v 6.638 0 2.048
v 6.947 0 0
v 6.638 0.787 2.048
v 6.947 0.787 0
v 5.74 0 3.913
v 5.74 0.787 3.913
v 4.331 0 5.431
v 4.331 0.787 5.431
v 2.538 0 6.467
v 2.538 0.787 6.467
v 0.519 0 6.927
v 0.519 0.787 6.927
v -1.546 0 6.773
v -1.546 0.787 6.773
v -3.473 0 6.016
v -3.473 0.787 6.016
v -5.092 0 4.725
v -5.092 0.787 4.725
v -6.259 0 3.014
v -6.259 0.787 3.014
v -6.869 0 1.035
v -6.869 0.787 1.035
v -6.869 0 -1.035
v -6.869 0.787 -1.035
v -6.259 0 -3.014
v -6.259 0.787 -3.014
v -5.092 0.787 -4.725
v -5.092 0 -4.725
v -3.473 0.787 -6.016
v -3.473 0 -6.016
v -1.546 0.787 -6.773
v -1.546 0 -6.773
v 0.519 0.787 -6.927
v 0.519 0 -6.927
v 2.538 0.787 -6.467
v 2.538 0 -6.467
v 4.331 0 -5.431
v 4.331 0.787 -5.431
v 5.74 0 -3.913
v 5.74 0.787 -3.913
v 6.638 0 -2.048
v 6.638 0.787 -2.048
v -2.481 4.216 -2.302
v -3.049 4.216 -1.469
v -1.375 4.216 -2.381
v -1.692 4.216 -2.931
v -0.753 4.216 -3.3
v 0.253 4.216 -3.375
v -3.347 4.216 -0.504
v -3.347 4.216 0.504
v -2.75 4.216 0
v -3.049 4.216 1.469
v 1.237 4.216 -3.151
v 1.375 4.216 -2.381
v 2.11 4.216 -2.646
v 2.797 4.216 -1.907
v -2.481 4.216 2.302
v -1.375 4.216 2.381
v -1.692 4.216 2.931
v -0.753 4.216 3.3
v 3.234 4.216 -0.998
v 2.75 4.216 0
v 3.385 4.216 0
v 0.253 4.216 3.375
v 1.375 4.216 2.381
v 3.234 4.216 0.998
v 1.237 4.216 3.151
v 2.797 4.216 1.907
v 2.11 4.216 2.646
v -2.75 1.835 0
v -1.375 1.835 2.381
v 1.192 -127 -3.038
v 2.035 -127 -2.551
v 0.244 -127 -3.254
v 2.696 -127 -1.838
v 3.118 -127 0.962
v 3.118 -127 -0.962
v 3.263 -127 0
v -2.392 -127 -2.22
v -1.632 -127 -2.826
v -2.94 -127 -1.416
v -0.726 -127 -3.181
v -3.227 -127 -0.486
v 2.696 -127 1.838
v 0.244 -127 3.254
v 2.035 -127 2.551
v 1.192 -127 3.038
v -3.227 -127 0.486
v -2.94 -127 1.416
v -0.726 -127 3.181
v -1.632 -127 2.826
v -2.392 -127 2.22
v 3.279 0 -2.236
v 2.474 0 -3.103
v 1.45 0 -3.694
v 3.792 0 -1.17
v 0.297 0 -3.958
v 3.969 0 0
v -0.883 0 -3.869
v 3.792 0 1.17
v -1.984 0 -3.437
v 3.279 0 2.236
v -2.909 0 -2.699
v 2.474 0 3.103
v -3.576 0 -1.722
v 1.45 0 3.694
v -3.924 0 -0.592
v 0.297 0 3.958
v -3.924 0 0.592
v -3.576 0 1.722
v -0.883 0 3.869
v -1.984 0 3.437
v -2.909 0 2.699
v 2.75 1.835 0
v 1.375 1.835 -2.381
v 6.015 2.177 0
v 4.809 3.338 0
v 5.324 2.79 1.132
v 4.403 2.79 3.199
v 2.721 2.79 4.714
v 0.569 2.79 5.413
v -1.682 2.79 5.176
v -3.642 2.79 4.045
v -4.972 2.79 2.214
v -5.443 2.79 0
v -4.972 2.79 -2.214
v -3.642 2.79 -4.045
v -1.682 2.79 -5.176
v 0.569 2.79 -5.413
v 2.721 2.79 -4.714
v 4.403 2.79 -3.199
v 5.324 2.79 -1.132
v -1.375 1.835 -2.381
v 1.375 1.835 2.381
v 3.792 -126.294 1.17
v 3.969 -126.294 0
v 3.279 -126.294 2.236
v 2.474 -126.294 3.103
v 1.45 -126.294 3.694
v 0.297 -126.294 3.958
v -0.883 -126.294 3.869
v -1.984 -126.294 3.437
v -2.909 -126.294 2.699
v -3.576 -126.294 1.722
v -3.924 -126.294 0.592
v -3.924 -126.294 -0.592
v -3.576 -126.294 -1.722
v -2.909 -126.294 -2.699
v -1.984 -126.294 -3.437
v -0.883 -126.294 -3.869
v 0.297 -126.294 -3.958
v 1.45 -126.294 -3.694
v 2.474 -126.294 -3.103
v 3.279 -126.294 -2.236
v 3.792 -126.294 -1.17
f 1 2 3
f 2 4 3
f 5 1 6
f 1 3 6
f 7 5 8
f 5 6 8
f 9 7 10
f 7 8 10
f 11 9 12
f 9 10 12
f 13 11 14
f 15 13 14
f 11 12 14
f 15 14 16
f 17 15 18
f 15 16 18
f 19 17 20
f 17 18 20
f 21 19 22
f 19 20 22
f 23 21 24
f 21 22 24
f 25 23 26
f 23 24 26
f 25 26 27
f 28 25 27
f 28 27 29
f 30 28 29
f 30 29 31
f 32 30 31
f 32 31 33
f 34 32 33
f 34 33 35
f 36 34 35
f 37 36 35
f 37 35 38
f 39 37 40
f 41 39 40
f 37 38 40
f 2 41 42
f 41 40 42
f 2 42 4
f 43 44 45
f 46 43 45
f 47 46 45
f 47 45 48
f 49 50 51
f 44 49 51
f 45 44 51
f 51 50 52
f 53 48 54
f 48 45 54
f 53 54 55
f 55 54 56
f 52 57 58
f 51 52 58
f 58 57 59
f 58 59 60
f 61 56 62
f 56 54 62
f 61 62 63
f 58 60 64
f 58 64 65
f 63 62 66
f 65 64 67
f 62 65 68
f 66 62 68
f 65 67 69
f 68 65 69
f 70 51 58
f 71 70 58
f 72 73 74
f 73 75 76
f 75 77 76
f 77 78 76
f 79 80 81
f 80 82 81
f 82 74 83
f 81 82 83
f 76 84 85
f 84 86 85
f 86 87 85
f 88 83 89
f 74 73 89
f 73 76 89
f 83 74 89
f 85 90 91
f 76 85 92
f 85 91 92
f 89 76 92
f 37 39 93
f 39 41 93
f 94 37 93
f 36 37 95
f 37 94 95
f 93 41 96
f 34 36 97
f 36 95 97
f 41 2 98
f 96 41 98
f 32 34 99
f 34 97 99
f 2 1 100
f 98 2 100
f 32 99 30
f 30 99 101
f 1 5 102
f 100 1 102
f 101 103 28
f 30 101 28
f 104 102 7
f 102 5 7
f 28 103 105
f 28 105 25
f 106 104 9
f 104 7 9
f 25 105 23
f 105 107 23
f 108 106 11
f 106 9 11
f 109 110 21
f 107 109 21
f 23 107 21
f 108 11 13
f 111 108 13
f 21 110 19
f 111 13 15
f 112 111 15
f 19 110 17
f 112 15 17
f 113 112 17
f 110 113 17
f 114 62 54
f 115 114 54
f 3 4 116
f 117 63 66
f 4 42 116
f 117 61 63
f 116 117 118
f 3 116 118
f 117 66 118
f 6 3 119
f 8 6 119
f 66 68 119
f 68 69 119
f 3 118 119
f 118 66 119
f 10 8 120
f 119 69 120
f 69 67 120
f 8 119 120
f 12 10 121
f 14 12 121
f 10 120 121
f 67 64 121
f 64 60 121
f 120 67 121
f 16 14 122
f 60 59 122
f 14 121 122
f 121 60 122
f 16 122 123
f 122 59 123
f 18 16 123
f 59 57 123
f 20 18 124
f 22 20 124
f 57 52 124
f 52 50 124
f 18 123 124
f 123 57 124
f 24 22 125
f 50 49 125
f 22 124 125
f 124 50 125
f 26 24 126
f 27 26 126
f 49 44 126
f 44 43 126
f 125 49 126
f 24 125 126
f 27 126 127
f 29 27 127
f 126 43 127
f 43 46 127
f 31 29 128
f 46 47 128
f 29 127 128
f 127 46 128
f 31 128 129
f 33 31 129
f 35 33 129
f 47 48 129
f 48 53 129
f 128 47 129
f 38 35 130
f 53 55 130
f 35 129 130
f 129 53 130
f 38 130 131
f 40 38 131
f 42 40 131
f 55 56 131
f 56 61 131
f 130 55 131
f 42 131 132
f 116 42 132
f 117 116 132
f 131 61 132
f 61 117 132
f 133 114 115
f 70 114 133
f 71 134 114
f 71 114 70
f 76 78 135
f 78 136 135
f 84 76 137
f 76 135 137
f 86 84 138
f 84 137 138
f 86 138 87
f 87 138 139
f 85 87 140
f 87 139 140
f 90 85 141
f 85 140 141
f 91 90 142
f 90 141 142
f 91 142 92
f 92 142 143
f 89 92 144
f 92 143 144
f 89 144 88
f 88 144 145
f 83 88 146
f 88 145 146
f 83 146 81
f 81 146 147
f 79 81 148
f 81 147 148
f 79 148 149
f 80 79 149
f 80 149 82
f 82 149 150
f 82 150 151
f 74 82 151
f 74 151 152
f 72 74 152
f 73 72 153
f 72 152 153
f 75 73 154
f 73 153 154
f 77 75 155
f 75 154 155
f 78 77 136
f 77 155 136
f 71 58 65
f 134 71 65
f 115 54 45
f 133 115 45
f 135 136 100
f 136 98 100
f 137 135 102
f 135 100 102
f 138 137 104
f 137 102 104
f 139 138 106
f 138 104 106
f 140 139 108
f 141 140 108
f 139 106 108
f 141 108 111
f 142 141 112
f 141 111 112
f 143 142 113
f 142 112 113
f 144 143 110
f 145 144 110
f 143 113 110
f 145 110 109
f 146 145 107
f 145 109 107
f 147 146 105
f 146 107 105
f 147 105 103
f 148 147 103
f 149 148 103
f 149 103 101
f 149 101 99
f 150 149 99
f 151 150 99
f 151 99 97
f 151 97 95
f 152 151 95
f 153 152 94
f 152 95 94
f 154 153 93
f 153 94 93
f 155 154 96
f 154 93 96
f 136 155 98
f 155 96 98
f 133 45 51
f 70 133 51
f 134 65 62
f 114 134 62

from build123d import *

# Parameters (mm, degrees)
CUT_EXTRUDE1_DEPTH = 2.38125


with BuildPart() as part:
    # Sketch1 → Base-Revolve (revolve)
    with BuildSketch(Plane.XY):
        with BuildLine():
            Line((0, -127), (3.263194444, -127))
            Line((3.263194444, -127), (3.96875, -126.294444444))
            Line((3.96875, -126.294444444), (3.96875, 0))
            Line((3.96875, 0), (6.9469, 0))
            Line((6.9469, 0), (6.9469, 0.7874))
            ThreePointArc((6.9469, 0.7874), (5.442852348, 2.789756108), (3.384630657, 4.2164))
            Line((3.384630657, 4.2164), (0, 4.2164))
            Line((0, 4.2164), (0, -127))
        make_face()
    revolve(axis=Axis((0, 69.088, 0), (0, -1, 0)))

    # Sketch2 → Cut-Extrude1 (cut)
    with BuildSketch(Plane(origin=(0, 4.2164, 0), x_dir=(-1, 0, 0), z_dir=(0, 1, 0))):
        Polygon((-2.749630657, 0), (-1.374815329, -2.38125), (1.374815329, -2.38125), (2.749630657, 0), (1.374815329, 2.38125), (-1.374815329, 2.38125), align=None)
    extrude(amount=-CUT_EXTRUDE1_DEPTH, mode=Mode.SUBTRACT)


solid = part.part
